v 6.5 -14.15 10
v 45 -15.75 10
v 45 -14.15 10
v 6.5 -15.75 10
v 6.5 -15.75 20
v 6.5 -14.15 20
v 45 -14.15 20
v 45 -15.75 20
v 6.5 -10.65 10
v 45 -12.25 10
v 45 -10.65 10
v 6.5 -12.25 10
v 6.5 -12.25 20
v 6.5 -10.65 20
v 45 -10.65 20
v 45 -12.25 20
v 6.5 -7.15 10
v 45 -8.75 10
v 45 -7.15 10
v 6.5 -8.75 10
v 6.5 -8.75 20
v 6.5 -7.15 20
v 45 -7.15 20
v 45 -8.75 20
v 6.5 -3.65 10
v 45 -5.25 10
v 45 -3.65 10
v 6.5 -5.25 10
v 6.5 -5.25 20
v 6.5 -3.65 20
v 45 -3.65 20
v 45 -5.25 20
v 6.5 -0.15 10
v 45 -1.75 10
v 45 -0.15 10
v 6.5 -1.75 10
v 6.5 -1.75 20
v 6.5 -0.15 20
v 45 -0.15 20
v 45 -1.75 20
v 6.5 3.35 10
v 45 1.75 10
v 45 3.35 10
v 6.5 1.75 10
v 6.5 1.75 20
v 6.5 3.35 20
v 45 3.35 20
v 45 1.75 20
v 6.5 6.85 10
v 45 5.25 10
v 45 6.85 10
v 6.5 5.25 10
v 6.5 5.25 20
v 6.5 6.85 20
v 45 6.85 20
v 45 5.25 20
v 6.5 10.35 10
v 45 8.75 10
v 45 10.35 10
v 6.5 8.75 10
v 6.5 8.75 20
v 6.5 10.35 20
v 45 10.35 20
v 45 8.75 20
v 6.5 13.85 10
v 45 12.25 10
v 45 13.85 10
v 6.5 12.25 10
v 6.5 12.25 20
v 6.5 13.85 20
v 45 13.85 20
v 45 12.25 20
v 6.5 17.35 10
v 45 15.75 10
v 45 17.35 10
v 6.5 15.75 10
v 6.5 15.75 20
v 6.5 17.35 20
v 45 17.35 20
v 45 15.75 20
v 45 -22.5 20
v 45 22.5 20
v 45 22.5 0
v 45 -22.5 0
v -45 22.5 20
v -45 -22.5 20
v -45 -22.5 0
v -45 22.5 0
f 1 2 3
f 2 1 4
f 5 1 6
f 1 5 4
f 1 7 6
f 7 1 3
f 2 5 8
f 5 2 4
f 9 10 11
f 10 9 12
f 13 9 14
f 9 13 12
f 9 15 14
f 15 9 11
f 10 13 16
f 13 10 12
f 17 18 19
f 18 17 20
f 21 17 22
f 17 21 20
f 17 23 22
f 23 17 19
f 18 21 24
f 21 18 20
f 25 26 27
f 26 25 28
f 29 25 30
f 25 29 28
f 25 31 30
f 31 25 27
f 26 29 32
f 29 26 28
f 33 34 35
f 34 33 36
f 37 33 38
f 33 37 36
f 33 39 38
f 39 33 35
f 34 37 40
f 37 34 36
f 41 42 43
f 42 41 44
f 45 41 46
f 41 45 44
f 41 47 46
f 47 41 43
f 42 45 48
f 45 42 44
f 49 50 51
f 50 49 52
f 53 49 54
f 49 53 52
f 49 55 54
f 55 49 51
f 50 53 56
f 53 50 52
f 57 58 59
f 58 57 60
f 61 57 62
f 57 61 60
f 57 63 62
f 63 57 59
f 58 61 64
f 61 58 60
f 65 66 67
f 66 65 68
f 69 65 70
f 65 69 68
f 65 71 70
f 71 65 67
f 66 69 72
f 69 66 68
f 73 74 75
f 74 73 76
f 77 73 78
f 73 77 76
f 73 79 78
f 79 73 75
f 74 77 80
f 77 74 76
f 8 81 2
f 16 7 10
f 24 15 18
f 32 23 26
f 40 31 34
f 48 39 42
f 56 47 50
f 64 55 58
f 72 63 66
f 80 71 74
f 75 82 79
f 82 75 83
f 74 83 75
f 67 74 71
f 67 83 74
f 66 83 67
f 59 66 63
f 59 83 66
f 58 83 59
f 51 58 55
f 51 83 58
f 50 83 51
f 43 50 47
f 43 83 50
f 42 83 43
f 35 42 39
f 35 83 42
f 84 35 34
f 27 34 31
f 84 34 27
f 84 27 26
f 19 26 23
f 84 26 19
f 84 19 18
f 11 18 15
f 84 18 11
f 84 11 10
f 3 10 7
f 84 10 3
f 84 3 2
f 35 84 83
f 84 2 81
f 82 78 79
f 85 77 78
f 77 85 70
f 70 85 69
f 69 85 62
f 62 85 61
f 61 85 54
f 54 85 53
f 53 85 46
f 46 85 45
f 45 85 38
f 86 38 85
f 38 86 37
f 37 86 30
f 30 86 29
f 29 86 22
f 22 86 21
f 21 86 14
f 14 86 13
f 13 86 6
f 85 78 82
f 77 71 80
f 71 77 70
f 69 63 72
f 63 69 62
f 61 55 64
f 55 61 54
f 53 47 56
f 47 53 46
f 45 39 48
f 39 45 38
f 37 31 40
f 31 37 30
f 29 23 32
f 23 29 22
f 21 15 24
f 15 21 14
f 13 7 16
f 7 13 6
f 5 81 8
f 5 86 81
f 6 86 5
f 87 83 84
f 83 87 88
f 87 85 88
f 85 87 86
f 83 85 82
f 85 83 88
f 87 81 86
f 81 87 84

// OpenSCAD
// Microscope slide drying rack
// Print orientation: base on XY plane, slots open upward (+Z)

// ---------- Parameters ----------
slide_count     = 10;    // number of microscope slides
slide_len       = 75;    // slide length along X (mm)
slide_wid       = 25;    // slide width along Y (mm)
slide_thk       = 1;     // slide thickness along Z (mm)

base_len        = 90;    // block length along X (mm)
base_wid        = 45;    // block width along Y (mm)
base_hgt        = 20;    // block height along Z (mm)

slot_len        = 77;    // slot length along X (mm)
slot_wid        = 1.6;   // slot width along Y (mm)
slot_depth      = 10;    // slot depth from top face (mm)
slot_pitch      = 3.5;   // centre-to-centre slot spacing along Y (mm)

eps             = 0.5;   // overcut past faces to avoid coplanar surfaces (mm)

$fn = 64;

// ---------- Derived ----------
slot_x0 = -(slot_len - base_len) / 2;   // slot start X (slots centred on block)
slot_y0 = -(slide_count - 1) * slot_pitch / 2; // first slot Y (group centred on block)

// ---------- Model ----------
difference() {
    // Base block
    translate([-base_len / 2, -base_wid / 2, 0])
        cube([base_len, base_wid, base_hgt]);

    // Parallel slots running along X, open at the top
    for (i = [0 : slide_count - 1])
        translate([slot_x0, slot_y0 + i * slot_pitch, base_hgt - slot_depth])
            cube([slot_len, slot_wid, slot_depth + eps]);
}
